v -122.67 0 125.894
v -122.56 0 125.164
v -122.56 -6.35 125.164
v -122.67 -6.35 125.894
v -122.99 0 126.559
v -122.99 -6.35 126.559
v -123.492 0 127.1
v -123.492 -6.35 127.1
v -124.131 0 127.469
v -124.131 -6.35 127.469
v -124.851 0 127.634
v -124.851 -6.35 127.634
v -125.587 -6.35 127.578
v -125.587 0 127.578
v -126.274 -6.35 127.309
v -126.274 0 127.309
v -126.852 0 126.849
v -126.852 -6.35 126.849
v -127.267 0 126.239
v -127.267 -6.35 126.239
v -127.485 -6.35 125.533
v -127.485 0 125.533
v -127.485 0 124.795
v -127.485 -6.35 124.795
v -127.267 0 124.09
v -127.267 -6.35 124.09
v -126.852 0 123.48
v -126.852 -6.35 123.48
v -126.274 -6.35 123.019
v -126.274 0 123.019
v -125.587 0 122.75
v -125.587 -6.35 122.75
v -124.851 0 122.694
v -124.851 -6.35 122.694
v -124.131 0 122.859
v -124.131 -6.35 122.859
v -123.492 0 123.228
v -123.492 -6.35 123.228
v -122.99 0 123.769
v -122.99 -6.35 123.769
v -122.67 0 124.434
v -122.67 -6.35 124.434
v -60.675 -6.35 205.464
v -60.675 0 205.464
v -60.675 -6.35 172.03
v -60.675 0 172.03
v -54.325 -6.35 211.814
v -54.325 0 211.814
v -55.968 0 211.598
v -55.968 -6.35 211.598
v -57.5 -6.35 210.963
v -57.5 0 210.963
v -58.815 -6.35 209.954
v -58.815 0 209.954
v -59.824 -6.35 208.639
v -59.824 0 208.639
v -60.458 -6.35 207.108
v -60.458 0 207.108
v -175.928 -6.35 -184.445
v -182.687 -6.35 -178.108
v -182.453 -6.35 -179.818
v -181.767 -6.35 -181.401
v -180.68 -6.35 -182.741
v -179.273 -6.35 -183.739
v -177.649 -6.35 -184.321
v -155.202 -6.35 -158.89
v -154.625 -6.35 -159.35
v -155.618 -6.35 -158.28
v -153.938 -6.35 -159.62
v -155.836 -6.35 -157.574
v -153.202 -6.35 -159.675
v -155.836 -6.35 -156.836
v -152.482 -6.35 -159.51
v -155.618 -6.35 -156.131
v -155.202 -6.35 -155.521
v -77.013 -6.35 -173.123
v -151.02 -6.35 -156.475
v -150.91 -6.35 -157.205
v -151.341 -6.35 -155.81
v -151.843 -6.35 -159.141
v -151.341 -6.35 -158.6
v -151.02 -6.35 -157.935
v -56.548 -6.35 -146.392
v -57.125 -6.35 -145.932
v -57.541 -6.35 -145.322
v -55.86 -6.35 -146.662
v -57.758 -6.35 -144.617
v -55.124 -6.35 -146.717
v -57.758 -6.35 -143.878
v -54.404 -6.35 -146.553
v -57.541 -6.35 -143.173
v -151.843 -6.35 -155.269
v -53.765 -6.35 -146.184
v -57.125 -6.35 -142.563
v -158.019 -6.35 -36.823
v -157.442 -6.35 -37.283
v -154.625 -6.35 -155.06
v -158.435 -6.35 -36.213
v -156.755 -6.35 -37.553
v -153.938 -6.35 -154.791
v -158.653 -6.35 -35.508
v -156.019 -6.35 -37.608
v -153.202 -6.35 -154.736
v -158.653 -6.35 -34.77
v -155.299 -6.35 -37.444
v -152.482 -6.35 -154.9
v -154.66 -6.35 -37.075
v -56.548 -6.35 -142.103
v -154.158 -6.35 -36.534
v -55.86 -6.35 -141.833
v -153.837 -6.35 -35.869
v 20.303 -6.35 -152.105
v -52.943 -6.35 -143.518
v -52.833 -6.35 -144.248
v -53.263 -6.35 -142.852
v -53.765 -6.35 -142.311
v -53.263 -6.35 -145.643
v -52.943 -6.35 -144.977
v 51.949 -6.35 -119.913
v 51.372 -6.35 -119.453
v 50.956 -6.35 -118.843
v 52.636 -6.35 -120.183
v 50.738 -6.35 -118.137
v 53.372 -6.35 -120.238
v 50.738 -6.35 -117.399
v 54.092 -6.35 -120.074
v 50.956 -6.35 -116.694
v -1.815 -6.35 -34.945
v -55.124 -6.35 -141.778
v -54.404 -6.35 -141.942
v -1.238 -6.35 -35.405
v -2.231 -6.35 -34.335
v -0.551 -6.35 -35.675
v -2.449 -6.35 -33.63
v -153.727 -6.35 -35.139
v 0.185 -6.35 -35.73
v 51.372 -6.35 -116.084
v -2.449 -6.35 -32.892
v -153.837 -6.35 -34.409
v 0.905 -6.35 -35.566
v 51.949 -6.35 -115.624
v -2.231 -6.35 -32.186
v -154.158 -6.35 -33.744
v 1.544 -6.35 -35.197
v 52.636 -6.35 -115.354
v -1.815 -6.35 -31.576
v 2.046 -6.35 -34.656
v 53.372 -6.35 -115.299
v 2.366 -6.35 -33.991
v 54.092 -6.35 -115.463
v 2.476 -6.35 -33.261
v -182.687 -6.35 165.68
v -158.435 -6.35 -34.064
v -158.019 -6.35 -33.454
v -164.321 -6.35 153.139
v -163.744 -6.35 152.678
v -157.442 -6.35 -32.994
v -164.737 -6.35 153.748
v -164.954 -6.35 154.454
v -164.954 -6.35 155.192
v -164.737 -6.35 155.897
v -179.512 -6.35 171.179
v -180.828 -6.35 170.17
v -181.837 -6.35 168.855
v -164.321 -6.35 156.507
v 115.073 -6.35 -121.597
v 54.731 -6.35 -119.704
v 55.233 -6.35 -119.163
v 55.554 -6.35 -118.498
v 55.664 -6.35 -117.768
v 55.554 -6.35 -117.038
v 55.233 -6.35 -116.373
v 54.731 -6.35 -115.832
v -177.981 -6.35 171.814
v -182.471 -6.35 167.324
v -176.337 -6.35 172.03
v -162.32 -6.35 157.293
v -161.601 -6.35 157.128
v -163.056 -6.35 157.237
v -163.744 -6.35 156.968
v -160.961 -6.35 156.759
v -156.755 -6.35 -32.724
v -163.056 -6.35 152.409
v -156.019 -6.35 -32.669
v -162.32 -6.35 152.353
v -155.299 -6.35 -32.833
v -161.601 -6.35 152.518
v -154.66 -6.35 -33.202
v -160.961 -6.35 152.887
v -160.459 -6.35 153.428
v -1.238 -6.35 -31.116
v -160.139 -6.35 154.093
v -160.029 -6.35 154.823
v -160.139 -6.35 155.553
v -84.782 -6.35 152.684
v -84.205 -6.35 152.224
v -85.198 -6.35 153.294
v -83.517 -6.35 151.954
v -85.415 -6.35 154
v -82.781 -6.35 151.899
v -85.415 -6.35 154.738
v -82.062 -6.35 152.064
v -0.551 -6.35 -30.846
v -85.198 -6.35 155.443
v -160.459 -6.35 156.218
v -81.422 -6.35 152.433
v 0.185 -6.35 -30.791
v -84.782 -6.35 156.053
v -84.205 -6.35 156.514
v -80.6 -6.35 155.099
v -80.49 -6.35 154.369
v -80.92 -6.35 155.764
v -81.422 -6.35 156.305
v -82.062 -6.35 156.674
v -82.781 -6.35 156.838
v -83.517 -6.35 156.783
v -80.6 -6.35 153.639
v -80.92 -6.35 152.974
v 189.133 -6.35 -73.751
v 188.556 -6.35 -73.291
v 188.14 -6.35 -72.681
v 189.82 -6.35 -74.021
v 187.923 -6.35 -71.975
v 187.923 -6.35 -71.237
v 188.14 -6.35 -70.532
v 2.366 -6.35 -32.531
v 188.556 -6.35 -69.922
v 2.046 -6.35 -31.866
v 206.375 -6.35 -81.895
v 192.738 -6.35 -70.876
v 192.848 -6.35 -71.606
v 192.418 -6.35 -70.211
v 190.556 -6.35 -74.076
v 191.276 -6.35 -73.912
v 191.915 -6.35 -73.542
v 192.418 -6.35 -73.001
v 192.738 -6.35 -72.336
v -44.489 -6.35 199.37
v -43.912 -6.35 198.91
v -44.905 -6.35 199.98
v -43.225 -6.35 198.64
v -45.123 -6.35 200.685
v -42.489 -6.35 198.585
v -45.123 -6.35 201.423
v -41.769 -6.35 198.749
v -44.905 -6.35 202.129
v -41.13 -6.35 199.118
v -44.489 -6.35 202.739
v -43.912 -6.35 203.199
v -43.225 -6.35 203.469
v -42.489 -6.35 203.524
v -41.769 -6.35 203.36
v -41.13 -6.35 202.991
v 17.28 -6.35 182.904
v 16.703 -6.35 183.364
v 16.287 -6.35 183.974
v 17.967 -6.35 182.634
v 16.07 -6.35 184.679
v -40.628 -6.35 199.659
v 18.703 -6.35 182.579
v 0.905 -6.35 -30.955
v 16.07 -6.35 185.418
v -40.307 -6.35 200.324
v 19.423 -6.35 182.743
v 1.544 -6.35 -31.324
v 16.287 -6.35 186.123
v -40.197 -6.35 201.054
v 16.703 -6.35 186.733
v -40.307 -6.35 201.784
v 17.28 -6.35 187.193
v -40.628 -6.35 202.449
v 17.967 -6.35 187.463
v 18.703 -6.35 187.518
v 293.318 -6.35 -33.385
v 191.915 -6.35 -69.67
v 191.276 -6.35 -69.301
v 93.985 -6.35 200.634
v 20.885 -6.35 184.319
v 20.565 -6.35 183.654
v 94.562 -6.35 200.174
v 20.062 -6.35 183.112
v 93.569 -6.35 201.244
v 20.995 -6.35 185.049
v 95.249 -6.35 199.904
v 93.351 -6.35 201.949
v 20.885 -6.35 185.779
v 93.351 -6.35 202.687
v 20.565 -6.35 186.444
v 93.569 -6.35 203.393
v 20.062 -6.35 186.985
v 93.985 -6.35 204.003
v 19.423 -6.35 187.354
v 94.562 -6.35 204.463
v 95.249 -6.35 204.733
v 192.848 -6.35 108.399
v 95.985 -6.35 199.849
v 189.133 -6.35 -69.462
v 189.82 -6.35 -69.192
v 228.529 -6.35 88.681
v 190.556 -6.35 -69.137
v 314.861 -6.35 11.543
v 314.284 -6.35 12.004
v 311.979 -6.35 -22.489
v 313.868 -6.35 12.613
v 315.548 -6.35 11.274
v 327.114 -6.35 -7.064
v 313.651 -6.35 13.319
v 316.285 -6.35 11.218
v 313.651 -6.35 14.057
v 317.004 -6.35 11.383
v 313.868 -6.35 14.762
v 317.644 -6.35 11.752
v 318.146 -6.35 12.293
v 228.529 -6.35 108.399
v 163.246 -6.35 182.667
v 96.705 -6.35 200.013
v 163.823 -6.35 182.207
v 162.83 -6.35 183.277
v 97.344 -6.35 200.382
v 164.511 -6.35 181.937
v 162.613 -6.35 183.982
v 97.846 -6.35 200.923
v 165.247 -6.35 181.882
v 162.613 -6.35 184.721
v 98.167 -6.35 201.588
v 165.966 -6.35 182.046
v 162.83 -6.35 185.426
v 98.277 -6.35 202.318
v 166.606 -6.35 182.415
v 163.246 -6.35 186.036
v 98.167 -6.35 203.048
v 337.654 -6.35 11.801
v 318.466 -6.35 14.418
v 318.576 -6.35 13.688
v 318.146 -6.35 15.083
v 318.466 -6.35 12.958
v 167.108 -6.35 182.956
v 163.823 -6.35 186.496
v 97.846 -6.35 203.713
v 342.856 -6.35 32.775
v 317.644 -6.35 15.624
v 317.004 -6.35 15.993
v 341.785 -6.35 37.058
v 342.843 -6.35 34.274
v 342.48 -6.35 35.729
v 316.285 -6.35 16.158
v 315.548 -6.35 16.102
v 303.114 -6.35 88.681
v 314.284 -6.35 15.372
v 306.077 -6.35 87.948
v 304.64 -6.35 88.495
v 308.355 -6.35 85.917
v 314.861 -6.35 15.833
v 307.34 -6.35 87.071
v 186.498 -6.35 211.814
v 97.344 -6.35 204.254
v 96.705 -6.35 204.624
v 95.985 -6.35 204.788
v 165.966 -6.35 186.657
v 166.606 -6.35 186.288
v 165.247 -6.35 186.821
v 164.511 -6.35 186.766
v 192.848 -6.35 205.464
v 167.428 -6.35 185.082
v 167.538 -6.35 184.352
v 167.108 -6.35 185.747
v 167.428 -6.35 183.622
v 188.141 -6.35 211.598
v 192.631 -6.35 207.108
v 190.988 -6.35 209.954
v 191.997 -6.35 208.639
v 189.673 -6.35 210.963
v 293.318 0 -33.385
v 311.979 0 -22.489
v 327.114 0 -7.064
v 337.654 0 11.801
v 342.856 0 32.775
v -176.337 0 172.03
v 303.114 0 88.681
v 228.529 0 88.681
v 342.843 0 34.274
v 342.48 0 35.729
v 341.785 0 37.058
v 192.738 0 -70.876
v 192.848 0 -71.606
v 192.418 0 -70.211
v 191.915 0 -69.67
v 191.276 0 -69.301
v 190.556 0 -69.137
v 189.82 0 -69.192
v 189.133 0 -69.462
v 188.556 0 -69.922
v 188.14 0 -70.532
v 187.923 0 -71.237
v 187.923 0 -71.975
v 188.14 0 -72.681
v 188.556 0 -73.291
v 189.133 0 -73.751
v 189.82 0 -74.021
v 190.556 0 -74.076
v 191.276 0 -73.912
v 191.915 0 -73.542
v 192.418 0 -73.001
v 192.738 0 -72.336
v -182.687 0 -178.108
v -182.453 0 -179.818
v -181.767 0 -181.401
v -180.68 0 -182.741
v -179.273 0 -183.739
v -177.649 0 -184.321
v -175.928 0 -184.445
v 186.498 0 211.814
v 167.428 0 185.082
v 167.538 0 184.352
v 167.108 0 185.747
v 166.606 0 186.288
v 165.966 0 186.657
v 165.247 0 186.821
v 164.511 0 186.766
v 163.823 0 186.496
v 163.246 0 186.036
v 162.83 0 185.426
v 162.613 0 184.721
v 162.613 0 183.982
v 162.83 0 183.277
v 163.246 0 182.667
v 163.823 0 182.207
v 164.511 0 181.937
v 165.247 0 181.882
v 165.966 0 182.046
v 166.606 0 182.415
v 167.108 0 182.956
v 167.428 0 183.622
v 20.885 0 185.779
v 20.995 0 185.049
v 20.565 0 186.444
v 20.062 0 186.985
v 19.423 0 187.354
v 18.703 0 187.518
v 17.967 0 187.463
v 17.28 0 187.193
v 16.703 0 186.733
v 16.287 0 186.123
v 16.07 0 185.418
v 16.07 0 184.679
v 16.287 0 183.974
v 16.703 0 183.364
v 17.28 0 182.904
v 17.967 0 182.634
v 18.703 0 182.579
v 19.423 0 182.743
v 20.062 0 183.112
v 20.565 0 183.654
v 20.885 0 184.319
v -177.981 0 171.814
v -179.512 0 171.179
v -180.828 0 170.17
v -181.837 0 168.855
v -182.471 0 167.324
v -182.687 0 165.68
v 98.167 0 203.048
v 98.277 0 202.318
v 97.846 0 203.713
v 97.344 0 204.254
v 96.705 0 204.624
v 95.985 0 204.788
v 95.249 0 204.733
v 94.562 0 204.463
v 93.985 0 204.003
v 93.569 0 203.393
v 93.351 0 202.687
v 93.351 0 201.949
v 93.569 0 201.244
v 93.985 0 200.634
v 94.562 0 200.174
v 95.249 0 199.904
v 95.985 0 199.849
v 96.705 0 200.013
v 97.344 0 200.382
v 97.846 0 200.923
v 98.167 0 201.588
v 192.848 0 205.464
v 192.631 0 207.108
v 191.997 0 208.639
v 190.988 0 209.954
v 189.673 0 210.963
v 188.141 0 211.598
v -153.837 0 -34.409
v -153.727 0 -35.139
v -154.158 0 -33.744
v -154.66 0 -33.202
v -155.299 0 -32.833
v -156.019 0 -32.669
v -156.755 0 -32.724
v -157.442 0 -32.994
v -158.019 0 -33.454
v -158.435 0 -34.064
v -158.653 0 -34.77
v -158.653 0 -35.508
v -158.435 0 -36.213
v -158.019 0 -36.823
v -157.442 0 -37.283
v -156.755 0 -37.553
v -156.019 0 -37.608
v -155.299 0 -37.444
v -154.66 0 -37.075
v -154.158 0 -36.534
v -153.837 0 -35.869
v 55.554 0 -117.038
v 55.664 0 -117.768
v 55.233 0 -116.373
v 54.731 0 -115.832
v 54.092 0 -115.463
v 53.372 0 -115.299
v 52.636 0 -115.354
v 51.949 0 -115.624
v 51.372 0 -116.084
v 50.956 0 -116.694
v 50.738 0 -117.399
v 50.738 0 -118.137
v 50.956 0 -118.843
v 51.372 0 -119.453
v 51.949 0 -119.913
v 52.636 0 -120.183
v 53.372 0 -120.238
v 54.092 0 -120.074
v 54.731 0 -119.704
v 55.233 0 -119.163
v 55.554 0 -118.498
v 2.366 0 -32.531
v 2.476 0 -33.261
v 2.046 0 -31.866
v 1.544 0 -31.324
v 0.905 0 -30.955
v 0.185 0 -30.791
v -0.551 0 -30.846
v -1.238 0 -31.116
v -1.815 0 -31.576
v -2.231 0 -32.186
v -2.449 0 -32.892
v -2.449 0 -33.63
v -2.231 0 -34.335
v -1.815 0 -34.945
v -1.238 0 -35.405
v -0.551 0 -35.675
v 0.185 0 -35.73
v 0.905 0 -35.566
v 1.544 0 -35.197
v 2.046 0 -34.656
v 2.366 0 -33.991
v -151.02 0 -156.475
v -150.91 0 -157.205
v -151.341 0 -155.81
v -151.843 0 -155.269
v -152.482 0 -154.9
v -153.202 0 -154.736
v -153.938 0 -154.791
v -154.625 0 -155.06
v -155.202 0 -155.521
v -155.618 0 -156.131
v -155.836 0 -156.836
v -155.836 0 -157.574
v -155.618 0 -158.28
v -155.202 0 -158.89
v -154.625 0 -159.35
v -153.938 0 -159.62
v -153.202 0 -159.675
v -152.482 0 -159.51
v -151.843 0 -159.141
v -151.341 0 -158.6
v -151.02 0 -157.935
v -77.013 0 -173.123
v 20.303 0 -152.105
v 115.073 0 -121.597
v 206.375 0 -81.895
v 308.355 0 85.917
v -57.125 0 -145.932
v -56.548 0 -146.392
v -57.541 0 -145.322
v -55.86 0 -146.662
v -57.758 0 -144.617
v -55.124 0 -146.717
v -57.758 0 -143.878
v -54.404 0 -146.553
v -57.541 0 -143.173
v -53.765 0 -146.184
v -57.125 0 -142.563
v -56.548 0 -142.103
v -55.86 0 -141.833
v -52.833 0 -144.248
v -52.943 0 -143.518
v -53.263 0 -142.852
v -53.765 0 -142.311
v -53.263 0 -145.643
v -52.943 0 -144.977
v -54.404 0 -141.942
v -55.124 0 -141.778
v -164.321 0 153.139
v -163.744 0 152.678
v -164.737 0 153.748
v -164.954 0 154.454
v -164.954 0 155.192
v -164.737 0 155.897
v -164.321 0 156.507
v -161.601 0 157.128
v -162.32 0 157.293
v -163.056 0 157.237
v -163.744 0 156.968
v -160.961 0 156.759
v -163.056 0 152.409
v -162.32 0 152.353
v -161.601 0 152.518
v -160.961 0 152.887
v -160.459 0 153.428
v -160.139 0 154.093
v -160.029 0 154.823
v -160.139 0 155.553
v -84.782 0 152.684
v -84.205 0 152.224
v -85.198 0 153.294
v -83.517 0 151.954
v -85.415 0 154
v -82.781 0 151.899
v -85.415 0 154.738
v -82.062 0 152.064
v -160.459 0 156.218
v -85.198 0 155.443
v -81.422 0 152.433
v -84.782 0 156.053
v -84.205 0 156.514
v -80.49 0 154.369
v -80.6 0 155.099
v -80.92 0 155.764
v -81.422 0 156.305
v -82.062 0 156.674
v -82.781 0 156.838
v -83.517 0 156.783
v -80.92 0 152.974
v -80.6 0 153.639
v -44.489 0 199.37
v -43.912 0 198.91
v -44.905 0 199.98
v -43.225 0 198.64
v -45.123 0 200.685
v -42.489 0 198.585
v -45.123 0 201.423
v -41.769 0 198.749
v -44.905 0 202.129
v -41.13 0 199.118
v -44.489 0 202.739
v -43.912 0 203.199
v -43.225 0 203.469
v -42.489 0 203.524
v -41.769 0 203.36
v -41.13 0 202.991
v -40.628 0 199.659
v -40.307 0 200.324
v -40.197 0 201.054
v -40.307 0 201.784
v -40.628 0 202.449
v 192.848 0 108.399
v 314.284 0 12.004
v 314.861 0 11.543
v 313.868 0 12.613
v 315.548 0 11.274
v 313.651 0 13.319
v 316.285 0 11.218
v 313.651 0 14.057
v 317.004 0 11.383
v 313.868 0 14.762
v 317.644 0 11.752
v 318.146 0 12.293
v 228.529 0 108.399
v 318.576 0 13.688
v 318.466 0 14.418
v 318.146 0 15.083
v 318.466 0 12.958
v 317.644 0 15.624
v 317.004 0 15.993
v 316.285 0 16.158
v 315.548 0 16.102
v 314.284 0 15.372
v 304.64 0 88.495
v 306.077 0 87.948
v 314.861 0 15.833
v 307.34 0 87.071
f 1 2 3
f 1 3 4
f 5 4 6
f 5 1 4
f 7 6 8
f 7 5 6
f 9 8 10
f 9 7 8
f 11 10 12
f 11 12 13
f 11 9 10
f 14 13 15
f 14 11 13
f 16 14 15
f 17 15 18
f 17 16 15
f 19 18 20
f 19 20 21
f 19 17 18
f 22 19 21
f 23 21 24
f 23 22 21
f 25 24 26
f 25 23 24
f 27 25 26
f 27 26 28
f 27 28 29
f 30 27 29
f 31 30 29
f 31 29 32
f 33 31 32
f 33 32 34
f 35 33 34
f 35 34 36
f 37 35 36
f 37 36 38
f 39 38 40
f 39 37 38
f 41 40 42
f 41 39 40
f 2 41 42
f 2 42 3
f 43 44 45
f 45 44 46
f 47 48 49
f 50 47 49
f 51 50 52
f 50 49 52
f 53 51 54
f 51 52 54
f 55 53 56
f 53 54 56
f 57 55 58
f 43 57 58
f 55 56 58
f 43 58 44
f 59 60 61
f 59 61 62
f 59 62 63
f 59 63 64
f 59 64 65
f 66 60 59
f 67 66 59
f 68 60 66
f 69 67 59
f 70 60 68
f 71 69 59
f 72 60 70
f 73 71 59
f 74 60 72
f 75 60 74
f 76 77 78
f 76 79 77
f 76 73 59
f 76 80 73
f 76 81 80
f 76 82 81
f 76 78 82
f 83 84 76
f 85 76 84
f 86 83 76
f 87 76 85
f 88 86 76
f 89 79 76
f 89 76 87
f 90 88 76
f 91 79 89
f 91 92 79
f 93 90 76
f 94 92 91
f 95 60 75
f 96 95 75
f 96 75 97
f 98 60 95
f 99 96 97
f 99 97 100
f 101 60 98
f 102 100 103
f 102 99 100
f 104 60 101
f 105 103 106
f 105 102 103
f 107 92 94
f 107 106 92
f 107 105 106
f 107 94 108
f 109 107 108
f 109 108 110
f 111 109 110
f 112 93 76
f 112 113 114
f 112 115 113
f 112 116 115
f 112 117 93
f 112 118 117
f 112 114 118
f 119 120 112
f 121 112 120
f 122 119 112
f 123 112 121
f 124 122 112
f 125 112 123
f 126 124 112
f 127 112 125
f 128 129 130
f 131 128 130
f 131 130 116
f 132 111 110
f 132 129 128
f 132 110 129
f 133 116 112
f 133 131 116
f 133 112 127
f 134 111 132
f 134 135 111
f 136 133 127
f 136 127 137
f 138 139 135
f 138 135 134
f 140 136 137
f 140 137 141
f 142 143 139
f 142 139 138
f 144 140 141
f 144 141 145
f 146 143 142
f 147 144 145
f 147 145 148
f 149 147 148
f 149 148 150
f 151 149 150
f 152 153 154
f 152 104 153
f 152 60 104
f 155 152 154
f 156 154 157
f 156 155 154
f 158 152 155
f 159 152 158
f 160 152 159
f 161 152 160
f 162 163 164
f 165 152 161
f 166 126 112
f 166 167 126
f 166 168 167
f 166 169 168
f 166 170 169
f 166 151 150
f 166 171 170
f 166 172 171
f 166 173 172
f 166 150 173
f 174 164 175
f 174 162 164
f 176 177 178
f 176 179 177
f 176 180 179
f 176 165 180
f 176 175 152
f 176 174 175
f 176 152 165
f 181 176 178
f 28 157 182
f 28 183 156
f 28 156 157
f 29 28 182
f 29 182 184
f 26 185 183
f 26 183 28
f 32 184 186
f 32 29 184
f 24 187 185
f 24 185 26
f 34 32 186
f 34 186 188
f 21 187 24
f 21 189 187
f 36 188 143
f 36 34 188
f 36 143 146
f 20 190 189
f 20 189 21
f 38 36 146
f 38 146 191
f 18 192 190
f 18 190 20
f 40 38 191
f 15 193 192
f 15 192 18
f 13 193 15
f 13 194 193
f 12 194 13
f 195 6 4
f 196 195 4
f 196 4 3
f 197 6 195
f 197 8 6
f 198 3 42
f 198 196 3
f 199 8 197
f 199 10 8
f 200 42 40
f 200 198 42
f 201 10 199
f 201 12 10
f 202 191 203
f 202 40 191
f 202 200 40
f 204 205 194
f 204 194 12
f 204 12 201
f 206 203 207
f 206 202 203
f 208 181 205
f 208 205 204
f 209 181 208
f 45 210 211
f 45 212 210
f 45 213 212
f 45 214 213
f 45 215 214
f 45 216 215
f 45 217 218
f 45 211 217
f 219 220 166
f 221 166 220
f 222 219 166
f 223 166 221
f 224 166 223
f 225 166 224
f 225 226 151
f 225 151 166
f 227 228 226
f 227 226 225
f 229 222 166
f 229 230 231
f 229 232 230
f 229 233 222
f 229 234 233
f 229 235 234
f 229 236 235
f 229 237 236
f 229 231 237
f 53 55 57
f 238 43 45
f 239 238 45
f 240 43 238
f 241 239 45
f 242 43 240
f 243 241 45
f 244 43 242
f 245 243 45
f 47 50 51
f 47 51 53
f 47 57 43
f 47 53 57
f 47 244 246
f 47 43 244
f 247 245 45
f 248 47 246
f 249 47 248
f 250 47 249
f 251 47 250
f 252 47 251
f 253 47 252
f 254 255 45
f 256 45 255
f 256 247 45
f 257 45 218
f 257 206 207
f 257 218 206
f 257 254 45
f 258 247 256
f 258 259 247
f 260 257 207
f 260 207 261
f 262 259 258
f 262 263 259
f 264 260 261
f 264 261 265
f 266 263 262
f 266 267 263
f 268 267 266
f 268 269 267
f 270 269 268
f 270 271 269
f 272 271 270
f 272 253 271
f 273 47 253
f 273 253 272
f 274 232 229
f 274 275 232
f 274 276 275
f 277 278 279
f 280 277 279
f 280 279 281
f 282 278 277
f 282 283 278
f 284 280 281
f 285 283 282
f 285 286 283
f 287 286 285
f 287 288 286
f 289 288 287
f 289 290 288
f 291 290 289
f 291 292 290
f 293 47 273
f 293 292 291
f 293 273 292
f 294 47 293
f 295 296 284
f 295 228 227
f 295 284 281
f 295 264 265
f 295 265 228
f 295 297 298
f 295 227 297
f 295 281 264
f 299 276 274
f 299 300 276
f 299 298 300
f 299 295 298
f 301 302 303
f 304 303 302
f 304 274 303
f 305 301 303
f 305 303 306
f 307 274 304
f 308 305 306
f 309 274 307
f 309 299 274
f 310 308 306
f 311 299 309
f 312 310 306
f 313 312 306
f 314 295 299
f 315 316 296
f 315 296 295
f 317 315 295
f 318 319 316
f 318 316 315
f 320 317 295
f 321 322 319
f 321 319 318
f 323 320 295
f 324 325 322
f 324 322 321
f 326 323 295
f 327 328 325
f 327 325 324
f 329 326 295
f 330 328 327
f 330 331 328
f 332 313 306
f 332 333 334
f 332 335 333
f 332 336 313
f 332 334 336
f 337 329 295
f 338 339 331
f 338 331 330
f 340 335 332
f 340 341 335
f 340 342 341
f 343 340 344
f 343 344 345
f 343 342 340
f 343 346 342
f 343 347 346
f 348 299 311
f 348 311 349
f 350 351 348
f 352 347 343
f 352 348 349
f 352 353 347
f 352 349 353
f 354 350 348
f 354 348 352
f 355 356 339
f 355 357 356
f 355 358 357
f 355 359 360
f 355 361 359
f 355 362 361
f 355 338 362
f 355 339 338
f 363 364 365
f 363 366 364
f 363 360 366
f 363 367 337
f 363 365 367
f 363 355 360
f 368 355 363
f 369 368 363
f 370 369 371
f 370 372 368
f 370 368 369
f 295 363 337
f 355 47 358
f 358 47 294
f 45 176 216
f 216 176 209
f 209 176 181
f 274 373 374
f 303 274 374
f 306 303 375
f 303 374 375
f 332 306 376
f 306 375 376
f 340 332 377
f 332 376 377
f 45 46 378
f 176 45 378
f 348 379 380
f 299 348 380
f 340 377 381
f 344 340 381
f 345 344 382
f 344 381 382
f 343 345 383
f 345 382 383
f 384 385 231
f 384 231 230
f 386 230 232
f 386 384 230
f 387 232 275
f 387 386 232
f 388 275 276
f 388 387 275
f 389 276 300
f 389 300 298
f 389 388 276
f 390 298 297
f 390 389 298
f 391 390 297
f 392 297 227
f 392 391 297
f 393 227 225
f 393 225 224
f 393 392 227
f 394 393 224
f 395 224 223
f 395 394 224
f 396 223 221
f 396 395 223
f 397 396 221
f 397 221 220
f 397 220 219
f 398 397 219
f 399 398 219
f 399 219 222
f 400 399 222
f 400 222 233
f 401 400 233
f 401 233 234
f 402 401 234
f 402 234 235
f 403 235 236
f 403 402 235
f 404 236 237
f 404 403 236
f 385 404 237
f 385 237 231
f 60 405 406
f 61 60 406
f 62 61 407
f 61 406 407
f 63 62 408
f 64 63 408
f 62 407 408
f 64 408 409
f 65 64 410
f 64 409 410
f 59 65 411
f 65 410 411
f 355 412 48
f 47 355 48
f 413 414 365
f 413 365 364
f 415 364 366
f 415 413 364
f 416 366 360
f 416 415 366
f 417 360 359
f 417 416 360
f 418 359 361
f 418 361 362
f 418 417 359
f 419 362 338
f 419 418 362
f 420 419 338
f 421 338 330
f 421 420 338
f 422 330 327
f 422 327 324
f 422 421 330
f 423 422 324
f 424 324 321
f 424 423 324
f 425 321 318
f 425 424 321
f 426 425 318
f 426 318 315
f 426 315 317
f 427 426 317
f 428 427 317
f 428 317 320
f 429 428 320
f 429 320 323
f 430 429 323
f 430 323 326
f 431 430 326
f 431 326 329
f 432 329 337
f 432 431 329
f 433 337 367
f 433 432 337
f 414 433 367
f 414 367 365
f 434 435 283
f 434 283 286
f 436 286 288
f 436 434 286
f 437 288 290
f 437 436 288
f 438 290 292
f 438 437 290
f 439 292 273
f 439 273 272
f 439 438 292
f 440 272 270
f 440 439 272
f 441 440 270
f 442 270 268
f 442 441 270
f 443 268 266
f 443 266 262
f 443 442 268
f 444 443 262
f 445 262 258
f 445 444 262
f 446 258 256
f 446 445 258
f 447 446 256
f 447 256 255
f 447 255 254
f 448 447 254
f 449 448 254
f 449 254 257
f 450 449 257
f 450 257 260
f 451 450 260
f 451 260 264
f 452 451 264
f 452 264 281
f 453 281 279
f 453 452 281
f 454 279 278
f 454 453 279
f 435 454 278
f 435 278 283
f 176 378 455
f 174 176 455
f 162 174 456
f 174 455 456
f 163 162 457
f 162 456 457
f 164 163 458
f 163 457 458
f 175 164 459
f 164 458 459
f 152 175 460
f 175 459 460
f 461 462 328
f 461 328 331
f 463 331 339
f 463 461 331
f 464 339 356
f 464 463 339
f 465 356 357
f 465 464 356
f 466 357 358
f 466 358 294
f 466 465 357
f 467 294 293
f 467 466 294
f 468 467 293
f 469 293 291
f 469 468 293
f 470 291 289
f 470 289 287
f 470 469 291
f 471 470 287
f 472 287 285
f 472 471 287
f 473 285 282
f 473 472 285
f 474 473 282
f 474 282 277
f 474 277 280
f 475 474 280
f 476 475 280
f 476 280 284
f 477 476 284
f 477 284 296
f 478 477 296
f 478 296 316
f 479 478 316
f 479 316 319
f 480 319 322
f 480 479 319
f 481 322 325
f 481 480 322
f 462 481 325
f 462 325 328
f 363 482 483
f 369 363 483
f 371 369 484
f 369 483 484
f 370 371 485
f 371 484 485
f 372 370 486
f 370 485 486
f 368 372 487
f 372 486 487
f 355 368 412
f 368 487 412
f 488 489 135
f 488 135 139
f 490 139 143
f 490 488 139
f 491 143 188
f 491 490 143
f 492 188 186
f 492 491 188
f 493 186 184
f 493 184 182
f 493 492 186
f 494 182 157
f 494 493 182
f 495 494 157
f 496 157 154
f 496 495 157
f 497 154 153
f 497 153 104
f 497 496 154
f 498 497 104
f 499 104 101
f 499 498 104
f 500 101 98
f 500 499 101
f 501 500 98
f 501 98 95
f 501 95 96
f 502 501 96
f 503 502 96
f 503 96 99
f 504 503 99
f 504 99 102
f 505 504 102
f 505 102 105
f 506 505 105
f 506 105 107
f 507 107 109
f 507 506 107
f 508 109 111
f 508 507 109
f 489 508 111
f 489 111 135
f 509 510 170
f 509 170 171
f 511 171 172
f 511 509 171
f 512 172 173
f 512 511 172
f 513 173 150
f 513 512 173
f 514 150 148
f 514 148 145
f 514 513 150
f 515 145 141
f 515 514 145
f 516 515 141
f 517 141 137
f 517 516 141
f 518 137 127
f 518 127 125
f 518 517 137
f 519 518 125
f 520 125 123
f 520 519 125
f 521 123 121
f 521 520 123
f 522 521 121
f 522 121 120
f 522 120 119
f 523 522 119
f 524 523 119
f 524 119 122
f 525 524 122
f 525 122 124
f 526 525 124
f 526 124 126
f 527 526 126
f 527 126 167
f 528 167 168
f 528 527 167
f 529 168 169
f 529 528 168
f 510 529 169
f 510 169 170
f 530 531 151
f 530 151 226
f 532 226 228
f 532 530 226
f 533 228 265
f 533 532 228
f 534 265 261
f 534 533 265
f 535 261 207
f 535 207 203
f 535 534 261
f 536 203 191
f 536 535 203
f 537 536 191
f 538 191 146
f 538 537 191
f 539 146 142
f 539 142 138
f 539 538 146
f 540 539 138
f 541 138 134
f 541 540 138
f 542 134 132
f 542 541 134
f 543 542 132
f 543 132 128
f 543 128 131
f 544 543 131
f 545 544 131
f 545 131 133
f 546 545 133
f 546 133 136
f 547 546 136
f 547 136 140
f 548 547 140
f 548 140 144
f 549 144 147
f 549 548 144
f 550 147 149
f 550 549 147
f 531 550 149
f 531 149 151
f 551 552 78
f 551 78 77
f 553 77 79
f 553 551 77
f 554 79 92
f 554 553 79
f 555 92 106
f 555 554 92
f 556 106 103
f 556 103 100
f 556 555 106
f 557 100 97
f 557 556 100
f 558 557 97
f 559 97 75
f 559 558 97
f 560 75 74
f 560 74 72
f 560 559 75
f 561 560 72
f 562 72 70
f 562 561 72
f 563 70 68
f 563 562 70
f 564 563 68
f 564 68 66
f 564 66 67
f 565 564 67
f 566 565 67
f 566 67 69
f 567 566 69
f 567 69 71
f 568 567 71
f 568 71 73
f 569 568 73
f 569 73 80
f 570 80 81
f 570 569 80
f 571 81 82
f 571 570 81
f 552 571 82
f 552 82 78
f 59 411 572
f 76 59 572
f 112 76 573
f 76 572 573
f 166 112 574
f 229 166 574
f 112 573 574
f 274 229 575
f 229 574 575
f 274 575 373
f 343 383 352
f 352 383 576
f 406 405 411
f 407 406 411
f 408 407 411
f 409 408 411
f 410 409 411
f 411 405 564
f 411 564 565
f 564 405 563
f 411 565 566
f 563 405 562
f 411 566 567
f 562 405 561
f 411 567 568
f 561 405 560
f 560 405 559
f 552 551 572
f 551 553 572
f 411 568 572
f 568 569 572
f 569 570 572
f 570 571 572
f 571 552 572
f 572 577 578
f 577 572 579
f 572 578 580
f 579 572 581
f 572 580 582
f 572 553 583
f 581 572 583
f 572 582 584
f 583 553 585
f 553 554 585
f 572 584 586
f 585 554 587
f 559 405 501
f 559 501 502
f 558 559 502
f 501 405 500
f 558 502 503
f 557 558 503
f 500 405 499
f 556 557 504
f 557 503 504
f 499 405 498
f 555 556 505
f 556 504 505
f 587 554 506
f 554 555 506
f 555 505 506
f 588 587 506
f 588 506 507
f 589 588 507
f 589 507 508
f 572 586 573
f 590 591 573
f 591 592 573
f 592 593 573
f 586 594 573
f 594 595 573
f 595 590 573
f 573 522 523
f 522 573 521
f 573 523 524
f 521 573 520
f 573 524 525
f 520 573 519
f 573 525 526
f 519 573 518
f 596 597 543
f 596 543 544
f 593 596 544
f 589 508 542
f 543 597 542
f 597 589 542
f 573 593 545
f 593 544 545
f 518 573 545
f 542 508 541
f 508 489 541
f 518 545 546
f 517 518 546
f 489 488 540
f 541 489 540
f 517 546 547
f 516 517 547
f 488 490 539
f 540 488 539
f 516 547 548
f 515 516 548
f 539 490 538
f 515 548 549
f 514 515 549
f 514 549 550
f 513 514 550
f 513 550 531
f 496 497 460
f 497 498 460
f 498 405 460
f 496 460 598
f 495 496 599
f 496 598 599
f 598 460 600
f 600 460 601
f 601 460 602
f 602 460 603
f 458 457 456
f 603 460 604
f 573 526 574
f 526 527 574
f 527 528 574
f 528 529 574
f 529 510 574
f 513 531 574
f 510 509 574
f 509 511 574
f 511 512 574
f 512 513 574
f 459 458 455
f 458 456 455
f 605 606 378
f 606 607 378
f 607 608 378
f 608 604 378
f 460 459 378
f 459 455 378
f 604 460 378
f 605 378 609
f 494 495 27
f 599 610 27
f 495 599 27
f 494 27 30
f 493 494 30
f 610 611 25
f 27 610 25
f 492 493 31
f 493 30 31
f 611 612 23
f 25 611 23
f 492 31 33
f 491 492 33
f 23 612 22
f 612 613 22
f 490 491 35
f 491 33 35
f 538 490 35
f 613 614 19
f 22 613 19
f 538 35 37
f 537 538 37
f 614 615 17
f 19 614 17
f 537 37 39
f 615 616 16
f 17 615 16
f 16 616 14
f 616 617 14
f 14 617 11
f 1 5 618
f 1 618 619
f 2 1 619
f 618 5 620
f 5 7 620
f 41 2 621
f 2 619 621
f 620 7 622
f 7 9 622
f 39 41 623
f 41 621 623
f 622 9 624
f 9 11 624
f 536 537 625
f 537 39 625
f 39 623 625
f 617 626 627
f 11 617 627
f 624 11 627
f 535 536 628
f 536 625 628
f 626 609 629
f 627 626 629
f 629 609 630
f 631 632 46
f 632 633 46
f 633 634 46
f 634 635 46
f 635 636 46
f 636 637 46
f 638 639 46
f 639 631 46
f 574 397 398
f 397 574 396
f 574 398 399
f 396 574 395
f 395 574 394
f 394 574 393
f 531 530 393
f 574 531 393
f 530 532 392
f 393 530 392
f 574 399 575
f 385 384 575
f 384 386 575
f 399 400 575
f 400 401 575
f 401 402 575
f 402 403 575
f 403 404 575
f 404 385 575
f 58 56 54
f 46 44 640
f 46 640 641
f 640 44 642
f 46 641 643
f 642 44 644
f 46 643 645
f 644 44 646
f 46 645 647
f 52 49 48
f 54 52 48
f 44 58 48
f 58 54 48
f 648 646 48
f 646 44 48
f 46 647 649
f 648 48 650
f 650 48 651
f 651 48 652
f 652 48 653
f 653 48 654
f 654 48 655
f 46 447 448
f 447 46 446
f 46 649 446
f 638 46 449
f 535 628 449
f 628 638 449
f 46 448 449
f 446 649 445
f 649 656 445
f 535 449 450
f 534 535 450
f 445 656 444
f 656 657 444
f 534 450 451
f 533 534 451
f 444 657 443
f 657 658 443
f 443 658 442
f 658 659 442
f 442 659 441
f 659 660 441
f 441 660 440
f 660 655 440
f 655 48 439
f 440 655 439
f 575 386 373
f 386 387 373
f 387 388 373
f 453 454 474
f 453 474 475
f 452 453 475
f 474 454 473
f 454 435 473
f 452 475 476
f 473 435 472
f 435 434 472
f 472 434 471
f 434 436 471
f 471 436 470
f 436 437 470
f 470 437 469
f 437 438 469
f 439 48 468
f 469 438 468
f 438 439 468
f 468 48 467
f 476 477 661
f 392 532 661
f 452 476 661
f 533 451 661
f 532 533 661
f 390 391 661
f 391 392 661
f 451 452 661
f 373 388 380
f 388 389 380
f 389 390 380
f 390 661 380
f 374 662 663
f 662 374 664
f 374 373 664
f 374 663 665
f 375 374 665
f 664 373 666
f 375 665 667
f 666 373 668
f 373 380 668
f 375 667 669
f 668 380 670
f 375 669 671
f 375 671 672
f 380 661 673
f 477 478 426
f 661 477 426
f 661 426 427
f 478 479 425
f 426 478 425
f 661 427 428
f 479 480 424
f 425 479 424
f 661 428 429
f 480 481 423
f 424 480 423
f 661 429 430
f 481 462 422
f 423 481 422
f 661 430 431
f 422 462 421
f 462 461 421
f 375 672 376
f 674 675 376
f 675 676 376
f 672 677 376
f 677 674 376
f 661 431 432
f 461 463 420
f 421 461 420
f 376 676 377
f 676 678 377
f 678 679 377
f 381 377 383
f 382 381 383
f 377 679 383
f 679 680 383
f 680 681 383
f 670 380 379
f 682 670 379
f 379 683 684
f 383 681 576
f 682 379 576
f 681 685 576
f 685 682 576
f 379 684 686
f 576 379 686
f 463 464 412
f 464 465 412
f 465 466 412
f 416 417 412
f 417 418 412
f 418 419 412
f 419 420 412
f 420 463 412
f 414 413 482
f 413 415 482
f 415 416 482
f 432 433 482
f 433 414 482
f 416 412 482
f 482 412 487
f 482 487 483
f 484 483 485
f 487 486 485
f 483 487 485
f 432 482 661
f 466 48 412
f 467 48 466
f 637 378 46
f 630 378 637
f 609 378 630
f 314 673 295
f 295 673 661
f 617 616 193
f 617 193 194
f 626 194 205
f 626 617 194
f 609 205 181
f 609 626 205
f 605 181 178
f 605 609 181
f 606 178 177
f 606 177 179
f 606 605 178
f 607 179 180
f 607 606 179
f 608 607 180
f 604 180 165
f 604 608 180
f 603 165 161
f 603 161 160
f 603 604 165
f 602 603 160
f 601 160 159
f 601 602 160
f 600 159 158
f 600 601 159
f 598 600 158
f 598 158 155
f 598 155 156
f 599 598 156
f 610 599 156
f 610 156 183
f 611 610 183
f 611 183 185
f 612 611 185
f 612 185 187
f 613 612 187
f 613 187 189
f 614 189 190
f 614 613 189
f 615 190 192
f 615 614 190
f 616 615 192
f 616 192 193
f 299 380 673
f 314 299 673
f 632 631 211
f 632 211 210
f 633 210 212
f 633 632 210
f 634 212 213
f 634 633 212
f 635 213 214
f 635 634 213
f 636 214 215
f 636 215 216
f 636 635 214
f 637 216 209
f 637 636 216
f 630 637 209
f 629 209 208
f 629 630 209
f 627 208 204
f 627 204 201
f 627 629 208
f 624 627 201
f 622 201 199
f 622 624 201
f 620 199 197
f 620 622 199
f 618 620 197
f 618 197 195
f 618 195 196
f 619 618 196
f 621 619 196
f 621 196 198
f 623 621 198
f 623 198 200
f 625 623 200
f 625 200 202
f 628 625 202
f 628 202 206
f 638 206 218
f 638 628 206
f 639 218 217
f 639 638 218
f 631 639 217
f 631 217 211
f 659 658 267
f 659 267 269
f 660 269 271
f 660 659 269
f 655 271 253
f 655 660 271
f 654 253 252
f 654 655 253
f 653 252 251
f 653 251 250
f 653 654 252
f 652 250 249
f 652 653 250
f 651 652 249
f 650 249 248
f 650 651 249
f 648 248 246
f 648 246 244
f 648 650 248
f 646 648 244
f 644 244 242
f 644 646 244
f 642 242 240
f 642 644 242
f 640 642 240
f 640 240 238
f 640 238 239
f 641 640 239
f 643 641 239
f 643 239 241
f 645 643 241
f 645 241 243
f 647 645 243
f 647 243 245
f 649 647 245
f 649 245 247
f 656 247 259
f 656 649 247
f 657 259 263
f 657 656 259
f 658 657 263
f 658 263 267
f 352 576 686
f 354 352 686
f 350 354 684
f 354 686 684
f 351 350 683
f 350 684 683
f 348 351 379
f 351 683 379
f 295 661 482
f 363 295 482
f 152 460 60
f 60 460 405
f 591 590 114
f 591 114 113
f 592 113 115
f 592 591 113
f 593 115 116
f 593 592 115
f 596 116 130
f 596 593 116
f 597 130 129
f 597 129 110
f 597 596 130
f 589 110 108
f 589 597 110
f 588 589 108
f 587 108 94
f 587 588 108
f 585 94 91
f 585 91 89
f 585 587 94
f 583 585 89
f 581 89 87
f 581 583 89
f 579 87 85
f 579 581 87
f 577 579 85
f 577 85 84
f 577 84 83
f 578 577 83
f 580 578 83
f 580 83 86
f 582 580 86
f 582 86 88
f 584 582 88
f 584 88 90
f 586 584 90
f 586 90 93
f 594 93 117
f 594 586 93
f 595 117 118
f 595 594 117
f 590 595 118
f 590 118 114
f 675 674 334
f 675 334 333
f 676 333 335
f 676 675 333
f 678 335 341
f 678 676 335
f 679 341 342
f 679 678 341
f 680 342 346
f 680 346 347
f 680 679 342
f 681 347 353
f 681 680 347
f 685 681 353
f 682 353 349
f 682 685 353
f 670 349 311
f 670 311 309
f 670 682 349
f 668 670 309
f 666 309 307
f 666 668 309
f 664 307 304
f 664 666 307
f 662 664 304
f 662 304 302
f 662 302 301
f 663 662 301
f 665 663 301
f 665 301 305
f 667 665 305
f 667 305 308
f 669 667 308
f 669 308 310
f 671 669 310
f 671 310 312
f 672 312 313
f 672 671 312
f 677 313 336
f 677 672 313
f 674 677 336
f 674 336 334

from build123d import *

# Parameters (mm, degrees)
F0_R     = 2.4765
F1_DEPTH = 6.35


with BuildPart() as f1:
    # F0 (on Front) → F1 (new body)
    with BuildSketch(Plane.XZ):
        with BuildLine():
            Line((-182.687491, 165.680151), (-182.687491, -178.108265))
            ThreePointArc((-182.687491, -178.108265), (-180.680274, -182.741055), (-175.927573, -184.44502))
            ThreePointArc((-175.927573, -184.44502), (68.064874, -138.02089), (293.317944, -33.385482))
            ThreePointArc((293.317944, -33.385482), (327.11409, -7.064195), (342.855905, 32.775295))
            ThreePointArc((342.855905, 32.775295), (342.704473, 35.012459), (341.784916, 37.057514))
            Line((341.784916, 37.057514), (308.354903, 85.916741))
            ThreePointArc((308.354903, 85.916741), (306.076721, 87.947579), (303.114203, 88.680997))
            Line((303.114203, 88.680997), (228.528813, 88.680997))
            Line((228.528813, 88.680997), (228.528813, 108.399421))
            Line((228.528813, 108.399421), (192.847848, 108.399421))
            Line((192.847848, 108.399421), (192.847848, 172.030151))
            Line((192.847848, 172.030151), (-60.674842, 172.030151))
            Line((-60.674842, 172.030151), (-176.337491, 172.030151))
            ThreePointArc((-176.337491, 172.030151), (-180.827619, 170.170279), (-182.687491, 165.680151))
        make_face()
        with Locations((-153.386965, -157.20512)):
            Circle(F0_R, mode=Mode.SUBTRACT)
        with Locations((-55.309255, -144.247517)):
            Circle(F0_R, mode=Mode.SUBTRACT)
        with Locations((53.187076, -117.768265)):
            Circle(F0_R, mode=Mode.SUBTRACT)
        with Locations((-156.203881, -35.138641)):
            Circle(F0_R, mode=Mode.SUBTRACT)
        with Locations((0, -33.260699)):
            Circle(F0_R, mode=Mode.SUBTRACT)
        with Locations((190.371348, -71.606256)):
            Circle(F0_R, mode=Mode.SUBTRACT)
        with Locations((-125.036161, 125.164057)):
            Circle(F0_R, mode=Mode.SUBTRACT)
        with Locations((-162.50541, 154.822963)):
            Circle(F0_R, mode=Mode.SUBTRACT)
        with Locations((-82.966307, 154.368845)):
            Circle(F0_R, mode=Mode.SUBTRACT)
        with Locations((316.099495, 13.687949)):
            Circle(F0_R, mode=Mode.SUBTRACT)
        with BuildLine():
            Line((-60.674842, 205.46418), (-60.674842, 172.030151))
            Line((-60.674842, 172.030151), (192.847848, 172.030151))
            Line((192.847848, 172.030151), (192.847848, 205.46418))
            ThreePointArc((192.847848, 205.46418), (190.987976, 209.954308), (186.497848, 211.81418))
            Line((186.497848, 211.81418), (-54.324842, 211.81418))
            ThreePointArc((-54.324842, 211.81418), (-58.814971, 209.954308), (-60.674842, 205.46418))
        make_face()
        with Locations((-42.673801, 201.054353)):
            Circle(F0_R, mode=Mode.SUBTRACT)
        with Locations((18.518413, 185.048574)):
            Circle(F0_R, mode=Mode.SUBTRACT)
        with Locations((95.800146, 202.318219)):
            Circle(F0_R, mode=Mode.SUBTRACT)
        with Locations((165.061638, 184.351559)):
            Circle(F0_R, mode=Mode.SUBTRACT)
    extrude(amount=F1_DEPTH)


solid = f1.part
